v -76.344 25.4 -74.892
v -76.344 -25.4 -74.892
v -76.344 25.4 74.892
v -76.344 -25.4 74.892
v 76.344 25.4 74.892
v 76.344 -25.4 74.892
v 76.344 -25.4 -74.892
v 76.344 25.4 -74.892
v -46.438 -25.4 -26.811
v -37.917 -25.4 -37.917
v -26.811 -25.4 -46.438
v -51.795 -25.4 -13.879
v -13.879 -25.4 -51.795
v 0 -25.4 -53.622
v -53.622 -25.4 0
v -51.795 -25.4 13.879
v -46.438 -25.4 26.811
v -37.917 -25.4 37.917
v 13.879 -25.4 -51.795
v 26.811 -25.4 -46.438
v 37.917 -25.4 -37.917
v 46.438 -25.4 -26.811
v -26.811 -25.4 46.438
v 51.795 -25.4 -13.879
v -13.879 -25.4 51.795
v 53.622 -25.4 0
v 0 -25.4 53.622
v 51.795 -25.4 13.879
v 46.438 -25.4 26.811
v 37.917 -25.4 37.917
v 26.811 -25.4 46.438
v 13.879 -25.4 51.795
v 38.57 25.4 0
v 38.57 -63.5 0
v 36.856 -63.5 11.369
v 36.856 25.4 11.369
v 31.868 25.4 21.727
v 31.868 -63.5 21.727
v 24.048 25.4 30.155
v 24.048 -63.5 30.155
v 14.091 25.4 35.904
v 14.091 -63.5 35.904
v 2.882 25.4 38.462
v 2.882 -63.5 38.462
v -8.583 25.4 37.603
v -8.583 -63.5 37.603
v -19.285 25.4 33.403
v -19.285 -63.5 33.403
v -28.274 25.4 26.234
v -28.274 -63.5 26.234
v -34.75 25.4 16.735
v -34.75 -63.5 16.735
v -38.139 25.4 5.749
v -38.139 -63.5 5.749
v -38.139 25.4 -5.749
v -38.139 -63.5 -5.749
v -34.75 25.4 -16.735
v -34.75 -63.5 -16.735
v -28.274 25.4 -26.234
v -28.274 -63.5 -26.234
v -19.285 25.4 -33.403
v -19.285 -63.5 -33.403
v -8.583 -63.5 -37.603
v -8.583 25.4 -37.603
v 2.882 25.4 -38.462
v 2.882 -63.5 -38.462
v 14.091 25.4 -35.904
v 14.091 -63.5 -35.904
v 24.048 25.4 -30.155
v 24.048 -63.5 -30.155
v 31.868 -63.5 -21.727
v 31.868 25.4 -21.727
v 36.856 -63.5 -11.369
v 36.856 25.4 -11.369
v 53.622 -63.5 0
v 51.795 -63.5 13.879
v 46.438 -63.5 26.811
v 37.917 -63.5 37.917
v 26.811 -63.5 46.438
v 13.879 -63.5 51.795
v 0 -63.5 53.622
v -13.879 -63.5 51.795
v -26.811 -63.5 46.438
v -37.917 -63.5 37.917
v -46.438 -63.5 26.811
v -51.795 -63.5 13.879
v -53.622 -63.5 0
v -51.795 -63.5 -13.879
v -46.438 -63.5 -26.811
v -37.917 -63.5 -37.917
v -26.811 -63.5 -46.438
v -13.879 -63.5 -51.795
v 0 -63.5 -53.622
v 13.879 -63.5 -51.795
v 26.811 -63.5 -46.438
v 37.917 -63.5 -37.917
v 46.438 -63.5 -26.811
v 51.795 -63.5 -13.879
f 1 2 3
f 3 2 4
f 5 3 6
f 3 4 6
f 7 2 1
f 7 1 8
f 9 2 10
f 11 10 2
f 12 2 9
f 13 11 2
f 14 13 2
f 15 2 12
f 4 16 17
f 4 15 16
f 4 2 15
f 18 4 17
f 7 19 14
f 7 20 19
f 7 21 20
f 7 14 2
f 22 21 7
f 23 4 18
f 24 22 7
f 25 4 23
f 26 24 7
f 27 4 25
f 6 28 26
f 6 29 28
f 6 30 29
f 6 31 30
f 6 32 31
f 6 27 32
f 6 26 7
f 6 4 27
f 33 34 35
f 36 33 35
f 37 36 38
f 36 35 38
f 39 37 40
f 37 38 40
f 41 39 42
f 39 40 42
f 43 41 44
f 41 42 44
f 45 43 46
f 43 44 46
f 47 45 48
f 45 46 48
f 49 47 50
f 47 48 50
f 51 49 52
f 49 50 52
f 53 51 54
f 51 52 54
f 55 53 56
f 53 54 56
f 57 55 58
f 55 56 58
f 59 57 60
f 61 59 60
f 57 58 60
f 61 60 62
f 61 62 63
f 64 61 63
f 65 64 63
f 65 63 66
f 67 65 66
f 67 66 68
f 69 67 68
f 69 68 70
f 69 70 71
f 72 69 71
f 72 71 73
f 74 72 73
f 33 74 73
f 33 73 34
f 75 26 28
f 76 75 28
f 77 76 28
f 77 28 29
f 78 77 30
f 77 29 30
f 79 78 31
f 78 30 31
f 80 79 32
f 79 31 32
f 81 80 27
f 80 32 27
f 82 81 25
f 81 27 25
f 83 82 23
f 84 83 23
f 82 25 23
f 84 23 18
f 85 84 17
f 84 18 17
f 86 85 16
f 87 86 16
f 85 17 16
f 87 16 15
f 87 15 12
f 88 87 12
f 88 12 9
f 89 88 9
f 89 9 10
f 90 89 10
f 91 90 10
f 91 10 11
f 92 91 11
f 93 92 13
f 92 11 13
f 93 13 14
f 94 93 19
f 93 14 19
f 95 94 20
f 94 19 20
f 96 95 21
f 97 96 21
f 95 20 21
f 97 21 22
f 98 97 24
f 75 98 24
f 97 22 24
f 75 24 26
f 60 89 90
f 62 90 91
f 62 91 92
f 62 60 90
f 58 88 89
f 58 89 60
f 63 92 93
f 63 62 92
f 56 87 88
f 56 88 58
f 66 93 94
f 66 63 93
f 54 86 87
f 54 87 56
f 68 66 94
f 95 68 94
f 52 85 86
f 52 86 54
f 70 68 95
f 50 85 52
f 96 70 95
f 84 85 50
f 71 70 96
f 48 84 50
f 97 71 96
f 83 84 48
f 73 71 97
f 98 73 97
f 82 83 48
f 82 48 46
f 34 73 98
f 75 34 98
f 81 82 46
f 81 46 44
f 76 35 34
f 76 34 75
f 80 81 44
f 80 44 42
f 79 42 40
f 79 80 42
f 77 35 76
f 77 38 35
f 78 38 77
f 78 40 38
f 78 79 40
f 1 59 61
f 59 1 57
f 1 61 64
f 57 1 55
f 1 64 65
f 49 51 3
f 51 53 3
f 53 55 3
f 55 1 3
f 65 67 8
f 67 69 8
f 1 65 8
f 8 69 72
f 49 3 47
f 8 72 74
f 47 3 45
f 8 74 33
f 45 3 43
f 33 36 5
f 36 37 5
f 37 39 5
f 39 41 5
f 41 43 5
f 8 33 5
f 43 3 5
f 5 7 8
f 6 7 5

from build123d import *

# Parameters (mm, degrees)
F0_W          = 152.688384
F0_H          = 149.784088
F1_DEPTH      = 25.4
F1_DEPTH_BACK = 25.4
F2_R          = 53.622423
F3_DEPTH      = 38.1
F4_R          = 38.570036
F5_DEPTH      = 127


with BuildPart() as f1:
    # F0 (on Front) → F1 (new body, two sides)
    with BuildSketch(Plane.XZ) as f1_sk:
        Rectangle(F0_W, F0_H)
    extrude(amount=F1_DEPTH)
    extrude(f1_sk.sketch, amount=-F1_DEPTH_BACK)

    # F2 (on face) → F3 (join)
    with BuildSketch(Plane.XZ.offset(25.4)):
        Circle(F2_R)
    extrude(amount=F3_DEPTH)

    # F4 (on face) → F5 (cut)
    with BuildSketch(Plane.XZ.offset(63.5)):
        Circle(F4_R)
    extrude(amount=-F5_DEPTH, mode=Mode.SUBTRACT)


solid = f1.part
